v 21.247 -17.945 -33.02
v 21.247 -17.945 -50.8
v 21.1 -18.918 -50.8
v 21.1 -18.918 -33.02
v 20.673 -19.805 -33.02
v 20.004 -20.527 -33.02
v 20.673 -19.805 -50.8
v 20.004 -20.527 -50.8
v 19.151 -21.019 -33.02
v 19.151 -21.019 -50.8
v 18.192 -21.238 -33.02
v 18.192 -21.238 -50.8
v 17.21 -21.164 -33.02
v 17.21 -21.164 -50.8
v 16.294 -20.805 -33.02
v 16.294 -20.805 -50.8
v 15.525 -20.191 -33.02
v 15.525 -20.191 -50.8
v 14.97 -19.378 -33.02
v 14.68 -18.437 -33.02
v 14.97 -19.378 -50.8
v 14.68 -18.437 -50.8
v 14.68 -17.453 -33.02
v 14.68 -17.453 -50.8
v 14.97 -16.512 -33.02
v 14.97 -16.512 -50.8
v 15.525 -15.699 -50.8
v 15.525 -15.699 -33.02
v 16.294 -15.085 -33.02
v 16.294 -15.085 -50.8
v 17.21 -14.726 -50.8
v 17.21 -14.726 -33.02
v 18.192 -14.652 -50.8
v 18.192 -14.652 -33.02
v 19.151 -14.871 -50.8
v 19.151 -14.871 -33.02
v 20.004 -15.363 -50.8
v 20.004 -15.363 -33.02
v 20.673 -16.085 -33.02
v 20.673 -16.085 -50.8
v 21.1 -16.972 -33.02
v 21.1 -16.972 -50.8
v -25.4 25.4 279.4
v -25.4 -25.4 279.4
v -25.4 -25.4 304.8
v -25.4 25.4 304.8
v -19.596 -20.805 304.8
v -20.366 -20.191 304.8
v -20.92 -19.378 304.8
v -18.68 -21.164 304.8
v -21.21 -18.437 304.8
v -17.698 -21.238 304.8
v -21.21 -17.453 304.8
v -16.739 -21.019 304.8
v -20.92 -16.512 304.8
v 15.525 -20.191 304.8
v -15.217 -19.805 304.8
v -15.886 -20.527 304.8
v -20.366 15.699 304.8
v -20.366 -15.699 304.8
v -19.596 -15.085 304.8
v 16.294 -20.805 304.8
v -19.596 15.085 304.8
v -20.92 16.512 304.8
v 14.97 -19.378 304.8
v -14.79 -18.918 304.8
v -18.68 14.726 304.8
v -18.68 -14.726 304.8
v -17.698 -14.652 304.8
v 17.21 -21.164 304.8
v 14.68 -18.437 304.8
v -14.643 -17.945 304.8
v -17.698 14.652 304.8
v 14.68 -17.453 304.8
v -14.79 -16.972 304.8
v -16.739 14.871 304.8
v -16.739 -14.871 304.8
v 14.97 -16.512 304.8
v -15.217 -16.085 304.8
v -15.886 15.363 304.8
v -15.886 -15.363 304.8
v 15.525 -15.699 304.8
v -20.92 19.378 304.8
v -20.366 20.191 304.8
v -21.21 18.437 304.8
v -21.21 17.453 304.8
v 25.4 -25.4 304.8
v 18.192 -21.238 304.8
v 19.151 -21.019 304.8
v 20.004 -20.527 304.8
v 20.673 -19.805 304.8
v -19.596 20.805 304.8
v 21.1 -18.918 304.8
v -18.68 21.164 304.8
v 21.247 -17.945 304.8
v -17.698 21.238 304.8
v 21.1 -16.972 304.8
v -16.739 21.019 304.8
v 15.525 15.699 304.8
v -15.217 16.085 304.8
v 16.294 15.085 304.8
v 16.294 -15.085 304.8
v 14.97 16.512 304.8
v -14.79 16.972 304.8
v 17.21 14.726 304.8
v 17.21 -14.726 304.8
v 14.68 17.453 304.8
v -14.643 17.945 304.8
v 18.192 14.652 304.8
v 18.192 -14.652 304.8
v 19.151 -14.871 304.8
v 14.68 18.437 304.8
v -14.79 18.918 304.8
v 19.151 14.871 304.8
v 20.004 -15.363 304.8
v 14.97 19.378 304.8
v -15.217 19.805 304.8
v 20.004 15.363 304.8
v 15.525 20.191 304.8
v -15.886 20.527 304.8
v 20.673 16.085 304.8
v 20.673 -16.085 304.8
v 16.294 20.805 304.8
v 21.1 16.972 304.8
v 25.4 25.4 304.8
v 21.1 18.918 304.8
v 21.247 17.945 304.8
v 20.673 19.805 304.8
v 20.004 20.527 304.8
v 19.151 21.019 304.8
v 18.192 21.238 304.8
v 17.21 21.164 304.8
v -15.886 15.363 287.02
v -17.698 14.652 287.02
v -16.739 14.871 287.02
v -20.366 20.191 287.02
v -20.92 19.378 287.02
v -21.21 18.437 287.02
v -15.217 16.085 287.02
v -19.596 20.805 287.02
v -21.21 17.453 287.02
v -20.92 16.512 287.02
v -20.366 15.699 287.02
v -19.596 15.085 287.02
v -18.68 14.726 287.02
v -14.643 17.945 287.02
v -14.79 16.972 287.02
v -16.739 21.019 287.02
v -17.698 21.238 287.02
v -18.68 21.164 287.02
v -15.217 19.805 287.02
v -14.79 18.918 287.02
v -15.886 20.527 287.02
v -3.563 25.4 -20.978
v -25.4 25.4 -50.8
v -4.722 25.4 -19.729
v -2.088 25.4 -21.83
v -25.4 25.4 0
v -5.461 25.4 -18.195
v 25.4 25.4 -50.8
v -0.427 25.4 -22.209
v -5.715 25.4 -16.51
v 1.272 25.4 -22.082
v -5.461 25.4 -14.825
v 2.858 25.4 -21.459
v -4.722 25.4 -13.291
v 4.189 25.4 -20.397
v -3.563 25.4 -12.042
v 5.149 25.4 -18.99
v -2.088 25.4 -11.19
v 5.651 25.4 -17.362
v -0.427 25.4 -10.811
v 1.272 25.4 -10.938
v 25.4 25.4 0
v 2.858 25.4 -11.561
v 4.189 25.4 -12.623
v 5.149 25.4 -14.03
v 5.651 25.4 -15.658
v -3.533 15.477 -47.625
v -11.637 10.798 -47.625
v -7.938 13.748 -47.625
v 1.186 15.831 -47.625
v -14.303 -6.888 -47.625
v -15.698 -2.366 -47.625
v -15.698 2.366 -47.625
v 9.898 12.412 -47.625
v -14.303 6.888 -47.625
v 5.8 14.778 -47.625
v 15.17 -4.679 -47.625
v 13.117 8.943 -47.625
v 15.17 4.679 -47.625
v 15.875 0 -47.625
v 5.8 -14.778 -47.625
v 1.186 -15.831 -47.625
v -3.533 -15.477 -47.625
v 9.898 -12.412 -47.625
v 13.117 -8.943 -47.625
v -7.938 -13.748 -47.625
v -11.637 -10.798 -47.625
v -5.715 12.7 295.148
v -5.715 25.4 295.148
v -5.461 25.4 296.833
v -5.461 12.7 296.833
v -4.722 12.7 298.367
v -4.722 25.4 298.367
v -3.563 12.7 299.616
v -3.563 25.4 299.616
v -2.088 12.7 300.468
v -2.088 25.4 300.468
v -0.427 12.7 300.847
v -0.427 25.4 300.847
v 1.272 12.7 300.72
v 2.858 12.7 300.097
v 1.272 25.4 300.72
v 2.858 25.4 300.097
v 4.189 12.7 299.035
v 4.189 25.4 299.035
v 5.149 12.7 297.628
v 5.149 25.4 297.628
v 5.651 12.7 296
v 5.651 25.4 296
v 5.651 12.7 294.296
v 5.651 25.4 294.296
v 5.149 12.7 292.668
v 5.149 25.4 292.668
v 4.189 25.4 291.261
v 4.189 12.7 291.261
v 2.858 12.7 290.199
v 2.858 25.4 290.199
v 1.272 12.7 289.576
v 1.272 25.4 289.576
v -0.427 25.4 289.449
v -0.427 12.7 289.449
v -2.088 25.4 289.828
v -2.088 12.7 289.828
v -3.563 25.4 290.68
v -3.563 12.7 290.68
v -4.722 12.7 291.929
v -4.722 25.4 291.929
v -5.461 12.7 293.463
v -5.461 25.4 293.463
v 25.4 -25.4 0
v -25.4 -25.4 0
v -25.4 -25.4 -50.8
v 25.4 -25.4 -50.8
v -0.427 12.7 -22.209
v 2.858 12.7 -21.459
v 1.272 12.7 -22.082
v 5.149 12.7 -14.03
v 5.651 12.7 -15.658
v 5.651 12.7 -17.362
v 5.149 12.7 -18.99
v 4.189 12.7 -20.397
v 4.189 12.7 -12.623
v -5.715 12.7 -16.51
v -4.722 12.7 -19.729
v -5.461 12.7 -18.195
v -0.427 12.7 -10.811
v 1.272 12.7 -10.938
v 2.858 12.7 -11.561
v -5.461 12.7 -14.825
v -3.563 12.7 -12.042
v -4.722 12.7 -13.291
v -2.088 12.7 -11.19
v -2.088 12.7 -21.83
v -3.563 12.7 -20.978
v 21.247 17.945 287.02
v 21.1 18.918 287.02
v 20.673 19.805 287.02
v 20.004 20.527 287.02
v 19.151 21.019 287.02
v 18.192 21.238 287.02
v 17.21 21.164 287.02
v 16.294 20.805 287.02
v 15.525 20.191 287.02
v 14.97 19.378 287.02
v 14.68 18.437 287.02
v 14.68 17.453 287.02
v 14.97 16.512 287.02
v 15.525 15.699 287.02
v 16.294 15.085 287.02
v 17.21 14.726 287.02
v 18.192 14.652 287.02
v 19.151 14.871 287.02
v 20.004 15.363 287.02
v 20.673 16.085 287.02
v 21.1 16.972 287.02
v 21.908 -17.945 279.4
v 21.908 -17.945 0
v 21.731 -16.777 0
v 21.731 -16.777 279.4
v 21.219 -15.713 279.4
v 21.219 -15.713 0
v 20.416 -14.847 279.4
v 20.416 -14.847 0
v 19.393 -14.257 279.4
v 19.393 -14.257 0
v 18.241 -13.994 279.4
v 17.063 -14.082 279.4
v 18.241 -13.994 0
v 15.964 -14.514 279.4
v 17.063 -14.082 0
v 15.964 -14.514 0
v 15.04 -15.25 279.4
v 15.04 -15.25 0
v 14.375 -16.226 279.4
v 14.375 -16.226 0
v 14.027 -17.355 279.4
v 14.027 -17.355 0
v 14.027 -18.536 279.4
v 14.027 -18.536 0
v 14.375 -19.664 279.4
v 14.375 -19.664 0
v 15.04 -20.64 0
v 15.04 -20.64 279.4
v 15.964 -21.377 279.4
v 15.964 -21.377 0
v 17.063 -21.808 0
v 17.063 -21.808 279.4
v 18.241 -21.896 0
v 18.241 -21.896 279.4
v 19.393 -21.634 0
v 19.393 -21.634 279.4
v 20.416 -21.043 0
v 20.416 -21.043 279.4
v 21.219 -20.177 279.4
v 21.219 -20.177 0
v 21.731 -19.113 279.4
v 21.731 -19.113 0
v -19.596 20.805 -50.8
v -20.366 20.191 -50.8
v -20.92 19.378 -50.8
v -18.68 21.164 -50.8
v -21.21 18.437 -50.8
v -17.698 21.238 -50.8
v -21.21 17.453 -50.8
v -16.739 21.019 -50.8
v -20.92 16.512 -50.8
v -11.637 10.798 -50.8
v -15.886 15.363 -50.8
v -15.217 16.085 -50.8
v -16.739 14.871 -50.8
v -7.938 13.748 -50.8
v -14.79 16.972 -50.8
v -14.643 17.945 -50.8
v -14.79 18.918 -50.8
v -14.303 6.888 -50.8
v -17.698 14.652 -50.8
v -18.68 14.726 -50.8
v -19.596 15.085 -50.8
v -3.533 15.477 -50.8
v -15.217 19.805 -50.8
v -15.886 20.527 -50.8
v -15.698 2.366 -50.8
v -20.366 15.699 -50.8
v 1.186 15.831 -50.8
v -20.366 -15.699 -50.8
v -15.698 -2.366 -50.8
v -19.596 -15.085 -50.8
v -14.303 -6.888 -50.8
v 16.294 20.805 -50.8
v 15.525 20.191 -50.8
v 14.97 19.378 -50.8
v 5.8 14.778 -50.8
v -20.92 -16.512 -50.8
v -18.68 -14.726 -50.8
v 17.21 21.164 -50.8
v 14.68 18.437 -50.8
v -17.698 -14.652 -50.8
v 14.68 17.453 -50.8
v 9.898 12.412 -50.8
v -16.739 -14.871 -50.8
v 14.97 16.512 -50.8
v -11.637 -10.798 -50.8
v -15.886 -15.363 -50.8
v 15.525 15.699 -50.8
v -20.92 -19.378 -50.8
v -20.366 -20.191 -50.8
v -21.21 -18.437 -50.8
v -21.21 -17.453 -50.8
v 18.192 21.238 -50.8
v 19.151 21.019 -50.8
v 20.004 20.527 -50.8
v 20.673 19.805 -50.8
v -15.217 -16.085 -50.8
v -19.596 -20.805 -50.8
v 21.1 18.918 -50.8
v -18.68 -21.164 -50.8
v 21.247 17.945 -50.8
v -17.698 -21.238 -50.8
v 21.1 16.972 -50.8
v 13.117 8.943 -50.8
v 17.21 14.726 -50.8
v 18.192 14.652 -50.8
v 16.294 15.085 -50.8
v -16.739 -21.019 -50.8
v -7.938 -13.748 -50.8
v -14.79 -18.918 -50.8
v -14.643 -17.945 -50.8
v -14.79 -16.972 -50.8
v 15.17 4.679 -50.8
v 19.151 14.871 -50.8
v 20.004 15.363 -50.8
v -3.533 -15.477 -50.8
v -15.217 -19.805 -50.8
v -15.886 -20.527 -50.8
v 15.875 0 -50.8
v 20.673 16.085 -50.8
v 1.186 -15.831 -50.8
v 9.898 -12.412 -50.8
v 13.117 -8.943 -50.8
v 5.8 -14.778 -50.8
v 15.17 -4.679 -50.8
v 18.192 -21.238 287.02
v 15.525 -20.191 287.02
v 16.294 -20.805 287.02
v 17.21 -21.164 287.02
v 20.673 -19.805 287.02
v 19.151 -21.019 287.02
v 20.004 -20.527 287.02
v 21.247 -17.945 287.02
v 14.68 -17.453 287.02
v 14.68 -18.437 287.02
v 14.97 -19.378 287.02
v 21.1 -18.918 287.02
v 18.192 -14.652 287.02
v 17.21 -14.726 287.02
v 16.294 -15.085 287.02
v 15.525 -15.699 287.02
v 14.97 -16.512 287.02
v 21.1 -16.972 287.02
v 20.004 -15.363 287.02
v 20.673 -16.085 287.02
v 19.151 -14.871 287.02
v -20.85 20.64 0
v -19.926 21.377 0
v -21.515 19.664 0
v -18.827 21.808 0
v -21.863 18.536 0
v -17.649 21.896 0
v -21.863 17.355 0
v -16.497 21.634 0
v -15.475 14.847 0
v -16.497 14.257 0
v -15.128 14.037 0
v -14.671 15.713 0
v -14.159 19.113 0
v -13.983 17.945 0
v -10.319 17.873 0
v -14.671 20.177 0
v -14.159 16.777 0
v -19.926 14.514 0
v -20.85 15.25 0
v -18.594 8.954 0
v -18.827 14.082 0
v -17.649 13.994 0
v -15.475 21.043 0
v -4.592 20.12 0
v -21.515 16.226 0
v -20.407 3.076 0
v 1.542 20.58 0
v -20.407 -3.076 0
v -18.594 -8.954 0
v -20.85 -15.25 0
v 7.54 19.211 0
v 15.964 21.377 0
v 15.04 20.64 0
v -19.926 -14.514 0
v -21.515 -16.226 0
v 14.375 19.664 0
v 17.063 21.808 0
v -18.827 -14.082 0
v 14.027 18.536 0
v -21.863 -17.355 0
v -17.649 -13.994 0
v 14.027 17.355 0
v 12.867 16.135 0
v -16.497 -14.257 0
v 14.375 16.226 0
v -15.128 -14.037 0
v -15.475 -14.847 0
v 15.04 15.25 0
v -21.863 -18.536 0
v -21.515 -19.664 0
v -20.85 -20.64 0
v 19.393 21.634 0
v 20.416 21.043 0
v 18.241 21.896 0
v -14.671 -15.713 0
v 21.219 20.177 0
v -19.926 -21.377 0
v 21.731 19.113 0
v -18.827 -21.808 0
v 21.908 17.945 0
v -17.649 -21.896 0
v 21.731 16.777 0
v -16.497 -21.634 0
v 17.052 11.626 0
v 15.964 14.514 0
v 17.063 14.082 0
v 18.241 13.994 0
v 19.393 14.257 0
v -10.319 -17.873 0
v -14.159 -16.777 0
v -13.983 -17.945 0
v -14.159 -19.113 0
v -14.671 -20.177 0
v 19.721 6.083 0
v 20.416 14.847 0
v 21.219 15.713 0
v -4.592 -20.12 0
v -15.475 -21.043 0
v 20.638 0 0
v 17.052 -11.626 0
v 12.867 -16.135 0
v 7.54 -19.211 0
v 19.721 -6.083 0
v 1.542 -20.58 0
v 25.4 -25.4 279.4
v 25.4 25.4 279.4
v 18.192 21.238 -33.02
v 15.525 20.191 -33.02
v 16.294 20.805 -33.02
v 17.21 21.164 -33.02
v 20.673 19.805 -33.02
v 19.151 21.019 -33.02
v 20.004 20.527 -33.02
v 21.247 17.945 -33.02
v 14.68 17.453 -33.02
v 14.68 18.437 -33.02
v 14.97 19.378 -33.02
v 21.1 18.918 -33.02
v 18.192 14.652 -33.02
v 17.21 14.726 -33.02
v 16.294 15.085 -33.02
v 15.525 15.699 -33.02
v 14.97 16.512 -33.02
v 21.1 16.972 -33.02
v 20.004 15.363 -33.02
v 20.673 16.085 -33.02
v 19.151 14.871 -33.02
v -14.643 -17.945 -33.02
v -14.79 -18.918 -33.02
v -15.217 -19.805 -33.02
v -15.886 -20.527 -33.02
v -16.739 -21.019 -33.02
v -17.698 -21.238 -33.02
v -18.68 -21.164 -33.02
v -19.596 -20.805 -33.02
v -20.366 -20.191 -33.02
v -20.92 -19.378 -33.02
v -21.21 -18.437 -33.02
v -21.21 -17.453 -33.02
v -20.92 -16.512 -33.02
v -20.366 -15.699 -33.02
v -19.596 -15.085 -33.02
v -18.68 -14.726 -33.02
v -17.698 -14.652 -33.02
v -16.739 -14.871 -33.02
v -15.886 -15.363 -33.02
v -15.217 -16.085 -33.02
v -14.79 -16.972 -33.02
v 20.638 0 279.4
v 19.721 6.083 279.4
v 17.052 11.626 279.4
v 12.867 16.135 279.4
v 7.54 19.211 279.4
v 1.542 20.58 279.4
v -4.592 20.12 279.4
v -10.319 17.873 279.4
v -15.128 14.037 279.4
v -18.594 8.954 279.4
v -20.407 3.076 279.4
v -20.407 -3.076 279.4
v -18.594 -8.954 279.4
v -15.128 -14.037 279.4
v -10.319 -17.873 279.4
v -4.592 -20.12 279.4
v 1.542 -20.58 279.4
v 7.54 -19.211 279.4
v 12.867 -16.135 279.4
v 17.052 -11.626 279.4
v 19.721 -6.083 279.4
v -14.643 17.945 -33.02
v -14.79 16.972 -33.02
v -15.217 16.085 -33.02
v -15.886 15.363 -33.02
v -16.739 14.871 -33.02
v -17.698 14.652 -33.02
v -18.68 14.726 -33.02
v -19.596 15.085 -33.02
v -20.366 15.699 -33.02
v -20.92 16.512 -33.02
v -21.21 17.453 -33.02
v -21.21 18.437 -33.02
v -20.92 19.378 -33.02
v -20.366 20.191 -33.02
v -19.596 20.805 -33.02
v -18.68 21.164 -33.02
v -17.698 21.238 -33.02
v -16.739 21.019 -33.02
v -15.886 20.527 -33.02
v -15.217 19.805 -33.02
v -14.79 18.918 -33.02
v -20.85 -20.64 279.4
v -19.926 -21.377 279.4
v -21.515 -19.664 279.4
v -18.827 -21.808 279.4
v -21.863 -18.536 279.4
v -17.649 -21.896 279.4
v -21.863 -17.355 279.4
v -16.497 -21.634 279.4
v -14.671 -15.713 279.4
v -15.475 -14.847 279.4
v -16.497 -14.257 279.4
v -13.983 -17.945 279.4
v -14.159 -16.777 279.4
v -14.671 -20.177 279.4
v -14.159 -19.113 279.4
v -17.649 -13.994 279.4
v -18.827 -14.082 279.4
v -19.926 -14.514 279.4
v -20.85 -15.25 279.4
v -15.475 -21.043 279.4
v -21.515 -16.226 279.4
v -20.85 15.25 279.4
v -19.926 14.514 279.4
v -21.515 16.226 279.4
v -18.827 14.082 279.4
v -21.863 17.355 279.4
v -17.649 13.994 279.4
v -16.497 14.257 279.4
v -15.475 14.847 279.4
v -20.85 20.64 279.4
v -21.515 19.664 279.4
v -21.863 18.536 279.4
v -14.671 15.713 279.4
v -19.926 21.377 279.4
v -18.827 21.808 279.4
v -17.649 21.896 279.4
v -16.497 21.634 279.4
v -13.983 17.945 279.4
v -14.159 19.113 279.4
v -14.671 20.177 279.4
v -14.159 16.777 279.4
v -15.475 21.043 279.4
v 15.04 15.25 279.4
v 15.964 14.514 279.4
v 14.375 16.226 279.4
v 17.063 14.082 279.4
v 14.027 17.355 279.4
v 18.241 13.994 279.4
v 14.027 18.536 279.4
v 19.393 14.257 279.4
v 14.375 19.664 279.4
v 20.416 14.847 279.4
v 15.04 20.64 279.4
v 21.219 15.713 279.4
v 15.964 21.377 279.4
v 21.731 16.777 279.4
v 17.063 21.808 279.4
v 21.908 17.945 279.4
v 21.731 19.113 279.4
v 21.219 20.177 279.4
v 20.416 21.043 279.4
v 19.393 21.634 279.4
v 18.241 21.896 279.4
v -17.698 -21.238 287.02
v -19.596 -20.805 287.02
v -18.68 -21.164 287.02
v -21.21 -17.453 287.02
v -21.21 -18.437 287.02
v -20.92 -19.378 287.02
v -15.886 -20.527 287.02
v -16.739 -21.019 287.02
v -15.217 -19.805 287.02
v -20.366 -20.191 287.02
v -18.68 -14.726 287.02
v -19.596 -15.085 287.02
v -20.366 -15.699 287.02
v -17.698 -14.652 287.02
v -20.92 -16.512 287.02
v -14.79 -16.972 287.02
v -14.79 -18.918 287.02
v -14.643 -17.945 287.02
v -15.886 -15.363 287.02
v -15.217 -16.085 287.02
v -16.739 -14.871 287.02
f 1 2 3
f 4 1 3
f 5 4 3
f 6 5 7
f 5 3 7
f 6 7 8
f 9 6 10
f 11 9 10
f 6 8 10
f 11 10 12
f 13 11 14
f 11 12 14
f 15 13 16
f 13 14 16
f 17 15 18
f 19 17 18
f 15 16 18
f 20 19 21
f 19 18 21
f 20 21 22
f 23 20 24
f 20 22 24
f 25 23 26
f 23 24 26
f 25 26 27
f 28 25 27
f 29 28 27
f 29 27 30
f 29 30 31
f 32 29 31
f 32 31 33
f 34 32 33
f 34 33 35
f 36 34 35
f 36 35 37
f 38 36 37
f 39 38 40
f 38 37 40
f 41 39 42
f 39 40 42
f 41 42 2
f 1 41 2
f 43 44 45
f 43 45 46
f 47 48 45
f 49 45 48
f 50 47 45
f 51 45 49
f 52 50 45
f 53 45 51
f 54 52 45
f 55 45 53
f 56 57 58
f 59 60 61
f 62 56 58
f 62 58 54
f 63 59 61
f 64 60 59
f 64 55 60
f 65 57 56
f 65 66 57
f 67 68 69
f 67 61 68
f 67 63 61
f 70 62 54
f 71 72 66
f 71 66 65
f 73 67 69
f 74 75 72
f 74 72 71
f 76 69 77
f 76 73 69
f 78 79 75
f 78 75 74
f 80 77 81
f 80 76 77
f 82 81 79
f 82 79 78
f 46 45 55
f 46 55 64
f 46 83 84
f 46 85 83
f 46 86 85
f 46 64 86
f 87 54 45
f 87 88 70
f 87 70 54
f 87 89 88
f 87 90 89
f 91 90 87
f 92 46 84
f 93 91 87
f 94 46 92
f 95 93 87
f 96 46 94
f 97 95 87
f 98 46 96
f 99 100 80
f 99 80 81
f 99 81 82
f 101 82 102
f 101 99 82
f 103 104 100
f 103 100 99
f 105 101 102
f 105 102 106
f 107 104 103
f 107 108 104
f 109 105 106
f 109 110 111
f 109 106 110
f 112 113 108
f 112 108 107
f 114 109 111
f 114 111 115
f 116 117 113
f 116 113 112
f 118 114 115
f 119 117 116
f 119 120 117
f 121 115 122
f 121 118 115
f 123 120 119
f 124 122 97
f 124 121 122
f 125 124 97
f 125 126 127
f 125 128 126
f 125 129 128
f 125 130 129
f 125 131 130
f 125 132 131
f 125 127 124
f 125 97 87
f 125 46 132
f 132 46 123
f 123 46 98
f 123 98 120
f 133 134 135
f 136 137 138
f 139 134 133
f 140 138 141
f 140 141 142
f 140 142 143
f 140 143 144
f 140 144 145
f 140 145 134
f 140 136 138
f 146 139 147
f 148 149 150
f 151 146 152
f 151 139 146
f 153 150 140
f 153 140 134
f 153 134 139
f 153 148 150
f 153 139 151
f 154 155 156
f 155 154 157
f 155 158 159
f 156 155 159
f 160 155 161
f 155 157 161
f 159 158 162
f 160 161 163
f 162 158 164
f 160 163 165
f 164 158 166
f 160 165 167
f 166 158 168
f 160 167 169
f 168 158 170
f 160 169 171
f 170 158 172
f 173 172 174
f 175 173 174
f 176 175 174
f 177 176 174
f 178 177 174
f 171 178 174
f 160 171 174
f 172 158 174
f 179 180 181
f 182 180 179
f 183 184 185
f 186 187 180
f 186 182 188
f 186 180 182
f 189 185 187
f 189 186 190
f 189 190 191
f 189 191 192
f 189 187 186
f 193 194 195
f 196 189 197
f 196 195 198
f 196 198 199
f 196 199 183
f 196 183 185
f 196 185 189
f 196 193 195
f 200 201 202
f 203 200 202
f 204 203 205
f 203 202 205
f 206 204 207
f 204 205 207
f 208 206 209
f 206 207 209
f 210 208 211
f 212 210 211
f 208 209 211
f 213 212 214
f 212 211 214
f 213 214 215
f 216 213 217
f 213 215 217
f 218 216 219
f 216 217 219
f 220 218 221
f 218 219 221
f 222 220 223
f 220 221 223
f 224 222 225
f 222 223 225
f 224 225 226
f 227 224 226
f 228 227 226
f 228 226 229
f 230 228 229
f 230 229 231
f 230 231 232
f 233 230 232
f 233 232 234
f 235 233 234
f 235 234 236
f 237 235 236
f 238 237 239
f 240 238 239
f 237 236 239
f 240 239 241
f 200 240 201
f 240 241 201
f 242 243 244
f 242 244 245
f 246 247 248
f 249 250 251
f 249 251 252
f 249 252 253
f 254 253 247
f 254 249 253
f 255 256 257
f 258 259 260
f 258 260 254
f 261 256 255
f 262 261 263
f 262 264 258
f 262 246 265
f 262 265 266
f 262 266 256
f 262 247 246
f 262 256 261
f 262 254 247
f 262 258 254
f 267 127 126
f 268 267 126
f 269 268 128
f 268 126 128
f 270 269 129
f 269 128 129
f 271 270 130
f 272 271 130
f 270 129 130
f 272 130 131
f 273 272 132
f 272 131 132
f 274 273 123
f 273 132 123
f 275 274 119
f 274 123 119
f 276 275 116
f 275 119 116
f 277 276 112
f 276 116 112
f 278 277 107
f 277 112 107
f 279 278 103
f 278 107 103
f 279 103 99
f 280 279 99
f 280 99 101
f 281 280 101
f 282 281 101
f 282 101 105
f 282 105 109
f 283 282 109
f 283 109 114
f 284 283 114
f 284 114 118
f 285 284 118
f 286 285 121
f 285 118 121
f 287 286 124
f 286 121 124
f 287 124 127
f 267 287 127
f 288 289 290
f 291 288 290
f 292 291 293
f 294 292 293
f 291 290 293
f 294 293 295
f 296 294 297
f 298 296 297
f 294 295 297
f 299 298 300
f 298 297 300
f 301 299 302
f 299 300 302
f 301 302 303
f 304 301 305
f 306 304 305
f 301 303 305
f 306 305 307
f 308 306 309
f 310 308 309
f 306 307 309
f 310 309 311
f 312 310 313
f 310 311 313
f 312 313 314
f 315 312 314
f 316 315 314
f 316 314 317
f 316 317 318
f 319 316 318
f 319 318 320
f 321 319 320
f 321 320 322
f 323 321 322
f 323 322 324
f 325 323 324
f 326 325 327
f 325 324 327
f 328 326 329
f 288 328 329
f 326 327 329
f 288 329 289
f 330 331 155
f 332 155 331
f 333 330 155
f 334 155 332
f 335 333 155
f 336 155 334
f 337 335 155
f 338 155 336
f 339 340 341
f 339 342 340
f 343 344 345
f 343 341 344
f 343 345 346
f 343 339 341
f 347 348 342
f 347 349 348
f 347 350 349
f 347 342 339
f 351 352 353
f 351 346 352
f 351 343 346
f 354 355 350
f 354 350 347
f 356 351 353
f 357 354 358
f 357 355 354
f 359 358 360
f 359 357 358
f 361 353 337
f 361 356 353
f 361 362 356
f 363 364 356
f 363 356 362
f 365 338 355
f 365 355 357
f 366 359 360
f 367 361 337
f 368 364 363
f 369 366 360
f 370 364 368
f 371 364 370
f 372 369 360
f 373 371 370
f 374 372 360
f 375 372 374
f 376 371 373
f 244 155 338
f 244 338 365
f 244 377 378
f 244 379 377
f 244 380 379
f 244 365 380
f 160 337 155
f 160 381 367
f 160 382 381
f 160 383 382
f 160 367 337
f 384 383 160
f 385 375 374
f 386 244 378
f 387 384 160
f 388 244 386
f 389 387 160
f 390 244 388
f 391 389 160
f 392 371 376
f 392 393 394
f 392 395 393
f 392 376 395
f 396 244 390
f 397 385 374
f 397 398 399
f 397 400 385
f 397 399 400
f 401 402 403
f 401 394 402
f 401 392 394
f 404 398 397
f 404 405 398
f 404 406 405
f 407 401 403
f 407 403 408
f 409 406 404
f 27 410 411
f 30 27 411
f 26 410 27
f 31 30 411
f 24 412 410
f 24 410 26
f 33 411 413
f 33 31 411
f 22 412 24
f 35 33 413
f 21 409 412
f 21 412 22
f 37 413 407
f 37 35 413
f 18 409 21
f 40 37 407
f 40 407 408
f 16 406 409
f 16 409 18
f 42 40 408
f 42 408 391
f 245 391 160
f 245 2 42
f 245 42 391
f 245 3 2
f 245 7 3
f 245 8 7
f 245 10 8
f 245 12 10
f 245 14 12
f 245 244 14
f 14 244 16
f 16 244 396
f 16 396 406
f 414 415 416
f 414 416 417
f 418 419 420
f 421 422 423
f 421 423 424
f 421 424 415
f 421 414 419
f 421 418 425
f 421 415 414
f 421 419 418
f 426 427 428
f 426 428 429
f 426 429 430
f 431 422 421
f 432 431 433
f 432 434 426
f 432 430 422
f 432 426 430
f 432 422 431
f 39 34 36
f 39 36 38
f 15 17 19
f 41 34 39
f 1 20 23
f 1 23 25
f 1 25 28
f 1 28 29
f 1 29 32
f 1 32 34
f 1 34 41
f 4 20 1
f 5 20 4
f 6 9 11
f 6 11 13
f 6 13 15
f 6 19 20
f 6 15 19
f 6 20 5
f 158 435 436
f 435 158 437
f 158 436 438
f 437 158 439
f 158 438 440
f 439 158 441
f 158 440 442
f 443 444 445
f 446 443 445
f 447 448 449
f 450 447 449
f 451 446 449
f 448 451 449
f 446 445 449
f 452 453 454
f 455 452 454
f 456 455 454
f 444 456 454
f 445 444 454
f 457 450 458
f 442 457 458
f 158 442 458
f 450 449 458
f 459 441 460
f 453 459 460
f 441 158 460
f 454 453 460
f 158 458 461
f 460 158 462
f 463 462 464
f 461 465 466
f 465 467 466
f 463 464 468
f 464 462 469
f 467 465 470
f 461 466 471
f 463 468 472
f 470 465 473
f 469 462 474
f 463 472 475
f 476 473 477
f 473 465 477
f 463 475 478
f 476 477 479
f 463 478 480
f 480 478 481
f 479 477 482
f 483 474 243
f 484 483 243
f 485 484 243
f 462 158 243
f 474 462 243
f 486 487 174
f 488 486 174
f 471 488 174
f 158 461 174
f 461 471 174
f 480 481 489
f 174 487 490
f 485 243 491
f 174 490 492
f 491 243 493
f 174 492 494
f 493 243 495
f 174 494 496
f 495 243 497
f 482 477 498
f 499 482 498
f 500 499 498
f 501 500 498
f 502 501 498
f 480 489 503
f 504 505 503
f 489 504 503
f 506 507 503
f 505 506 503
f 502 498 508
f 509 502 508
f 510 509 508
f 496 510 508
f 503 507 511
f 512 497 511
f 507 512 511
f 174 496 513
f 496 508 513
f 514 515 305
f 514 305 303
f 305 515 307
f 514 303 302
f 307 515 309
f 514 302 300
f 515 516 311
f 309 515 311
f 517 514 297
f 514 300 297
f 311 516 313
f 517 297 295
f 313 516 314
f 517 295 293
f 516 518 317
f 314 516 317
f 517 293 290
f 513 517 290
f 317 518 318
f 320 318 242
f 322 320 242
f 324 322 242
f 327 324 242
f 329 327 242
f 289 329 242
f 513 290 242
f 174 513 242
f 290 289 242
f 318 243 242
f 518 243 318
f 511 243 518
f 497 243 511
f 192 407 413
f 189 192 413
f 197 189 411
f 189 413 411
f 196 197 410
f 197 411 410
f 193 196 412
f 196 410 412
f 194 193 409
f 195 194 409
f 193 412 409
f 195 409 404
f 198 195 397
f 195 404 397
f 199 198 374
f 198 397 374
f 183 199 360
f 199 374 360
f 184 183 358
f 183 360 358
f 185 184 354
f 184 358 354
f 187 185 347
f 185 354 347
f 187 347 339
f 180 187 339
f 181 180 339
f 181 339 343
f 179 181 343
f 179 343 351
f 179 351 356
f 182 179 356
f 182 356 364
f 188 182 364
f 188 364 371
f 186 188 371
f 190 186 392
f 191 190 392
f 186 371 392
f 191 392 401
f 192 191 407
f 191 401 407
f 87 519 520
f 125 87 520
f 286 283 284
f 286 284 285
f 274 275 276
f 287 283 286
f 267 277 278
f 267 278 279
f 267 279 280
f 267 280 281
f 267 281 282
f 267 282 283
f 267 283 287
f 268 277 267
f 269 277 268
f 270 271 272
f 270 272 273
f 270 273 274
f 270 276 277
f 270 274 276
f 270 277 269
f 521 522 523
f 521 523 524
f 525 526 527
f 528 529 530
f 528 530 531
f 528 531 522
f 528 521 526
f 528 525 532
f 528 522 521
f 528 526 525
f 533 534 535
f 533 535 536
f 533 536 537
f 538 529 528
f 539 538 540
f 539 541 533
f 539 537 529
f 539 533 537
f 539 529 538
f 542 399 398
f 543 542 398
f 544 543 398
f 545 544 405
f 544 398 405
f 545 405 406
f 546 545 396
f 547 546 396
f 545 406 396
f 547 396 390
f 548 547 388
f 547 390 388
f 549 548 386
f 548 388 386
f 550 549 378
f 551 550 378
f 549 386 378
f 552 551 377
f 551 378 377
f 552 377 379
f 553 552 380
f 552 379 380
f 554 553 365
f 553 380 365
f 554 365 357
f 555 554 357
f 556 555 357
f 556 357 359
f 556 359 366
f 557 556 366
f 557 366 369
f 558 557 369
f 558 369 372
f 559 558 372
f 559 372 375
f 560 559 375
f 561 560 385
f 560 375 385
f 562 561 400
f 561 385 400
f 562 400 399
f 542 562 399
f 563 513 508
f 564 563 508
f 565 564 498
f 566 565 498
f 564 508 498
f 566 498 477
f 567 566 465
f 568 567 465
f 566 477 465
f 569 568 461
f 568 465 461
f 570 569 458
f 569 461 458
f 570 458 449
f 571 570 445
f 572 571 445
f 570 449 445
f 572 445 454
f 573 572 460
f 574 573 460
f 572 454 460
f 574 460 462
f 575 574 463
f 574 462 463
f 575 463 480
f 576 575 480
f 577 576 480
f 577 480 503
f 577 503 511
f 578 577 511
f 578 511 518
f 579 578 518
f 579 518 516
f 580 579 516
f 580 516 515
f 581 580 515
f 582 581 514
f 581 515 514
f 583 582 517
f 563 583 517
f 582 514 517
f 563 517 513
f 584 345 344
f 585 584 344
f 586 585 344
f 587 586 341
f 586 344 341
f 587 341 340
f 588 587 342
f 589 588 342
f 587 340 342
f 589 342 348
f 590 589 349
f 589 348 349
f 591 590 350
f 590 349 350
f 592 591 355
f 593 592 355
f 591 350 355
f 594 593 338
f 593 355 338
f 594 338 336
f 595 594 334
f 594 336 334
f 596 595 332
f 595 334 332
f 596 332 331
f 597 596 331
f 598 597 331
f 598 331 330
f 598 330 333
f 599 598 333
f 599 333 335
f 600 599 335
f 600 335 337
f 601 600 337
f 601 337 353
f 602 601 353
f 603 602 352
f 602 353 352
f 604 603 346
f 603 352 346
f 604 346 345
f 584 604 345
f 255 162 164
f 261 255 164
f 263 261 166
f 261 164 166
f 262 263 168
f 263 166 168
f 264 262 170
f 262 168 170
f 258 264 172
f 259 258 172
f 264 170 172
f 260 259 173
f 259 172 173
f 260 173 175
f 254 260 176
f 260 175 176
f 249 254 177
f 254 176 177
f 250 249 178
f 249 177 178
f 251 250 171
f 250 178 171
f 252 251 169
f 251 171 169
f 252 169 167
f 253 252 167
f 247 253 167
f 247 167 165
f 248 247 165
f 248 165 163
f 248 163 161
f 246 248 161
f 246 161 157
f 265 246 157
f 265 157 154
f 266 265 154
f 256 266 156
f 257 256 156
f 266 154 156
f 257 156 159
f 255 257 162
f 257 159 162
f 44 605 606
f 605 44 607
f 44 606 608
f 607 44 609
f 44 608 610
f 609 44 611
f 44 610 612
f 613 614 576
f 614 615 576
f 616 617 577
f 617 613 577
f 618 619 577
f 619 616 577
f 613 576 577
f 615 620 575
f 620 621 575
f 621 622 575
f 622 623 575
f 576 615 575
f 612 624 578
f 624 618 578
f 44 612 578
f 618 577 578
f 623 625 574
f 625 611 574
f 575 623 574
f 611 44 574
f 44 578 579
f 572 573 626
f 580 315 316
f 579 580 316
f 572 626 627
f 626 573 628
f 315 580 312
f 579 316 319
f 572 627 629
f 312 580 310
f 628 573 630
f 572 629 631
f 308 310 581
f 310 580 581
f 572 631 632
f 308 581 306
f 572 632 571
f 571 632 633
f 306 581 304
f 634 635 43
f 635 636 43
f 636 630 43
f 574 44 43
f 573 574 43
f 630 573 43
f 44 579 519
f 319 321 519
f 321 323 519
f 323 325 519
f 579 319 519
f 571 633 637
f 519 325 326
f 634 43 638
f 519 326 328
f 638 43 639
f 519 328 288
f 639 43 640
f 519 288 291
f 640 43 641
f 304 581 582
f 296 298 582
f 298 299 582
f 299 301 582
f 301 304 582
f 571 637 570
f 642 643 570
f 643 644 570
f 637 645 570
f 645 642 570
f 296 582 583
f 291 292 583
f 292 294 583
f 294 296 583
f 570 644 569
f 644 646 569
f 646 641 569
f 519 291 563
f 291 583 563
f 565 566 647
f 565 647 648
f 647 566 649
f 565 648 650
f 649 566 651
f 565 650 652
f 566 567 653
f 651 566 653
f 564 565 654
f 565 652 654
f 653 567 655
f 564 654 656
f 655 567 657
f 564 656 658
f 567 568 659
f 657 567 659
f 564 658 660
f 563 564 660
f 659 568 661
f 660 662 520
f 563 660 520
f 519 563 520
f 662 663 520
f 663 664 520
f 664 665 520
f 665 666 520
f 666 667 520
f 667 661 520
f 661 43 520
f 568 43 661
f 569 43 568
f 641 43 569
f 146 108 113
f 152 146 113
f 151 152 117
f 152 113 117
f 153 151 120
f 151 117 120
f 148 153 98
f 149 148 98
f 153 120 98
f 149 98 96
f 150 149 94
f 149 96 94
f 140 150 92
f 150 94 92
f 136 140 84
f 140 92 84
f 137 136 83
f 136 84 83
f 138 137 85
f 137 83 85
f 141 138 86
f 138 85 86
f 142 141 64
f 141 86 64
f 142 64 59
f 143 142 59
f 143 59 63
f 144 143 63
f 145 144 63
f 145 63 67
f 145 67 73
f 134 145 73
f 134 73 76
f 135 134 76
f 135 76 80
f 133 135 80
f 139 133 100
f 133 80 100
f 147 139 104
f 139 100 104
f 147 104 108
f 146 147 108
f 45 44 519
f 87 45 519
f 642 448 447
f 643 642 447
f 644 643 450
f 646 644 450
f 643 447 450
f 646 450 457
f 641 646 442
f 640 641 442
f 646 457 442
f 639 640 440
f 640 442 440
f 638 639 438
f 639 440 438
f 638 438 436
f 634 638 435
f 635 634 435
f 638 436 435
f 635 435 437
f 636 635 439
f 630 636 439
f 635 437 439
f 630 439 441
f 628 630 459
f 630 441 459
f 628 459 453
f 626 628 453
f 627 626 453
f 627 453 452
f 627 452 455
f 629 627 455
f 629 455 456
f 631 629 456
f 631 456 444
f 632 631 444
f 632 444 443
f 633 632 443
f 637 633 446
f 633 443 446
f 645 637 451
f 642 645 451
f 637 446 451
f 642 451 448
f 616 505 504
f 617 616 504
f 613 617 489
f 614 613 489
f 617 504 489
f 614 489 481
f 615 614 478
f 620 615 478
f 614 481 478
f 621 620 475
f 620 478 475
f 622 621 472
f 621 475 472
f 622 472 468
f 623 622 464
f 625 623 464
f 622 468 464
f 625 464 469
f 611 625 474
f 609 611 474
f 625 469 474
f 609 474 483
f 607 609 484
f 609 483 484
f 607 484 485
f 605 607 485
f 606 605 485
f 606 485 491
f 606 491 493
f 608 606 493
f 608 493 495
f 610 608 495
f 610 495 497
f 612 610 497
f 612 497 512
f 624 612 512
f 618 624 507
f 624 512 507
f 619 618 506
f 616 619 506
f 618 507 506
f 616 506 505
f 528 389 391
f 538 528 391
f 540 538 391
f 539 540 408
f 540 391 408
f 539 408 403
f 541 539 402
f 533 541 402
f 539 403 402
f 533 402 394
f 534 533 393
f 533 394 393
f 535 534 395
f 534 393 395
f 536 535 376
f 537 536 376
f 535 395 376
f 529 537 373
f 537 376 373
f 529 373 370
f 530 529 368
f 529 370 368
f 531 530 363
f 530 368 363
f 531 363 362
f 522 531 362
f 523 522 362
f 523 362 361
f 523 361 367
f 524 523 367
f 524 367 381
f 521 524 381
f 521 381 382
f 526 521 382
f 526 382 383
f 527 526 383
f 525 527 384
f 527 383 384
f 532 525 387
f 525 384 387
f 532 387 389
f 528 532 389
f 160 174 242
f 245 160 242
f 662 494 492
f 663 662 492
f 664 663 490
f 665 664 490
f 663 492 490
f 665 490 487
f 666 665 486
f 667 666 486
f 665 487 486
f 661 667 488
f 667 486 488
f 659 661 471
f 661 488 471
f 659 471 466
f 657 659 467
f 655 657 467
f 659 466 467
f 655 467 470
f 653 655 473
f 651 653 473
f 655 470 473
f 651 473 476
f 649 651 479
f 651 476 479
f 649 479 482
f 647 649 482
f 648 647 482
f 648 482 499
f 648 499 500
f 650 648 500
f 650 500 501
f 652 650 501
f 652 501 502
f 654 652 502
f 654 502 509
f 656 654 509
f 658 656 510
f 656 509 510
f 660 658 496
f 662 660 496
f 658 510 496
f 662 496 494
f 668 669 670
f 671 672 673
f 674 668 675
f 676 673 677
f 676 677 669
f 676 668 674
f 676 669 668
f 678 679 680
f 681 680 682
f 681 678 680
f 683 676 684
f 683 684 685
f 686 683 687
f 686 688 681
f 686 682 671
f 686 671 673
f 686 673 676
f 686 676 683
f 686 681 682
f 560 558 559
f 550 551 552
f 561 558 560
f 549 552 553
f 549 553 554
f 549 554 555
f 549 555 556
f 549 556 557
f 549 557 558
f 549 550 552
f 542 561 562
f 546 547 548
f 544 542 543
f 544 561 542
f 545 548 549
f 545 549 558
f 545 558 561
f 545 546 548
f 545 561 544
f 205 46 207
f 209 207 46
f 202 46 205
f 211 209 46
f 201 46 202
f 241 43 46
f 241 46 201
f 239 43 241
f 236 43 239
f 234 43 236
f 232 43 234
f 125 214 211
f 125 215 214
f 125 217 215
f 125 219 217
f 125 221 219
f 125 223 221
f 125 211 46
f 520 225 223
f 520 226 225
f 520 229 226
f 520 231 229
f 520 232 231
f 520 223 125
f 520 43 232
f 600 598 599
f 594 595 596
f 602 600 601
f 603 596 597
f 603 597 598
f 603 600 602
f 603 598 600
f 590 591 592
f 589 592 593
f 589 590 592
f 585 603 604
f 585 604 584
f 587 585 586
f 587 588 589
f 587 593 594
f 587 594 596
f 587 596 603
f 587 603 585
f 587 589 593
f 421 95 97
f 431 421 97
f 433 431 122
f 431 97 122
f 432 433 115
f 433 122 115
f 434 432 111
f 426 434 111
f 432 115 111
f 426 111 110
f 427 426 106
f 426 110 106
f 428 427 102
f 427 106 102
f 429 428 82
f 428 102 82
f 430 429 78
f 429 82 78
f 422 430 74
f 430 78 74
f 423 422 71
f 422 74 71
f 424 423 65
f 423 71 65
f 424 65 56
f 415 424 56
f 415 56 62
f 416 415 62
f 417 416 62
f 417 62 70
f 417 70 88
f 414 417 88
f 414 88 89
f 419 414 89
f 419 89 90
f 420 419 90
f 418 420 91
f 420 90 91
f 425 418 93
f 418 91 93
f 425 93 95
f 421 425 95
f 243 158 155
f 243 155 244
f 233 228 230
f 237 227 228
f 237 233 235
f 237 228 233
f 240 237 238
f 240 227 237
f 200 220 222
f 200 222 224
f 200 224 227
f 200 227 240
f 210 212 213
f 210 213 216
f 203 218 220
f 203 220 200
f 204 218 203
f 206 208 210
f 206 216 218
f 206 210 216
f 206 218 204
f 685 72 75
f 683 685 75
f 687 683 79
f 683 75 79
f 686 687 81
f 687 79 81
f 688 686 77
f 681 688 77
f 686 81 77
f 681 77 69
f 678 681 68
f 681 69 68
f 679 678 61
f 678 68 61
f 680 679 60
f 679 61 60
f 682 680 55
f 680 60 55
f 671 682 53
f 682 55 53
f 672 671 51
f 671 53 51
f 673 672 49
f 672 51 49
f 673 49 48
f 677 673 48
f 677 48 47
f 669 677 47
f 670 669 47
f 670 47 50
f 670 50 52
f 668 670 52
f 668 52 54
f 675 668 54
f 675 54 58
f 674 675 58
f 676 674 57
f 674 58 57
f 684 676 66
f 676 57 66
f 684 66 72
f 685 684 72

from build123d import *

# Parameters (mm, degrees)
F0_R      = 20.6375
F0_R_2    = 3.9624
F1_DEPTH  = 279.4
F2_W      = 50.8
F2_H      = 50.8
F3_DEPTH  = 25.4
F4_W      = 50.8
F4_H      = 50.8
F5_DEPTH  = 50.8
F6_R      = 3.302
F7_DEPTH  = 17.78
F8_R      = 3.302
F9_DEPTH  = 17.78
F10_R     = 15.875
F11_DEPTH = 3.175
F12_R     = 5.715
F13_DEPTH = 12.7


with BuildPart() as f1:
    # F0 (on Top) → F1 (new body)
    with BuildSketch(Plane.XY):
        Circle(F0_R)
        with Locations((-17.9451, 17.9451)):
            Circle(F0_R_2)
        with Locations((17.9451, 17.9451)):
            Circle(F0_R_2)
        with Locations((17.9451, -17.9451)):
            Circle(F0_R_2)
        with Locations((-17.9451, -17.9451)):
            Circle(F0_R_2)
    extrude(amount=F1_DEPTH)

    # F2 (on face) → F3 (join)
    with BuildSketch(Plane.XY.offset(279.4)):
        Rectangle(F2_W, F2_H)
    extrude(amount=F3_DEPTH)

    # F4 (on face) → F5 (join)
    with BuildSketch(Plane(origin=(0, 0, 0), x_dir=(1, 0, 0), z_dir=(0, 0, -1))):
        Rectangle(F4_W, F4_H)
    extrude(amount=F5_DEPTH)

    # F6 (on face) → F7 (cut)
    with BuildSketch(Plane(origin=(0, 0, -50.8), x_dir=(1, 0, 0), z_dir=(0, 0, -1))):
        with Locations((-17.9451, 17.9451)):
            Circle(F6_R)
        with Locations((17.9451, 17.9451)):
            Circle(F6_R)
        with Locations((17.9451, -17.9451)):
            Circle(F6_R)
        with Locations((-17.9451, -17.9451)):
            Circle(F6_R)
    extrude(amount=-F7_DEPTH, mode=Mode.SUBTRACT)

    # F8 (on face) → F9 (cut)
    with BuildSketch(Plane.XY.offset(304.8)):
        with Locations((17.9451, -17.9451)):
            Circle(F8_R)
        with Locations((-17.9451, -17.9451)):
            Circle(F8_R)
        with Locations((17.9451, 17.9451)):
            Circle(F8_R)
        with Locations((-17.9451, 17.9451)):
            Circle(F8_R)
    extrude(amount=-F9_DEPTH, mode=Mode.SUBTRACT)

    # F10 (on face) → F11 (cut)
    with BuildSketch(Plane(origin=(0, 0, -50.8), x_dir=(1, 0, 0), z_dir=(0, 0, -1))):
        Circle(F10_R)
    extrude(amount=-F11_DEPTH, mode=Mode.SUBTRACT)

    # F12 (on face) → F13 (cut)
    with BuildSketch(Plane(origin=(0, 25.4, 0), x_dir=(-1, 0, 0), z_dir=(0, 1, 0))):
        with Locations((0, -16.51)):
            Circle(F12_R)
        with Locations((0, 295.148)):
            Circle(F12_R)
    extrude(amount=-F13_DEPTH, mode=Mode.SUBTRACT)


solid = f1.part
